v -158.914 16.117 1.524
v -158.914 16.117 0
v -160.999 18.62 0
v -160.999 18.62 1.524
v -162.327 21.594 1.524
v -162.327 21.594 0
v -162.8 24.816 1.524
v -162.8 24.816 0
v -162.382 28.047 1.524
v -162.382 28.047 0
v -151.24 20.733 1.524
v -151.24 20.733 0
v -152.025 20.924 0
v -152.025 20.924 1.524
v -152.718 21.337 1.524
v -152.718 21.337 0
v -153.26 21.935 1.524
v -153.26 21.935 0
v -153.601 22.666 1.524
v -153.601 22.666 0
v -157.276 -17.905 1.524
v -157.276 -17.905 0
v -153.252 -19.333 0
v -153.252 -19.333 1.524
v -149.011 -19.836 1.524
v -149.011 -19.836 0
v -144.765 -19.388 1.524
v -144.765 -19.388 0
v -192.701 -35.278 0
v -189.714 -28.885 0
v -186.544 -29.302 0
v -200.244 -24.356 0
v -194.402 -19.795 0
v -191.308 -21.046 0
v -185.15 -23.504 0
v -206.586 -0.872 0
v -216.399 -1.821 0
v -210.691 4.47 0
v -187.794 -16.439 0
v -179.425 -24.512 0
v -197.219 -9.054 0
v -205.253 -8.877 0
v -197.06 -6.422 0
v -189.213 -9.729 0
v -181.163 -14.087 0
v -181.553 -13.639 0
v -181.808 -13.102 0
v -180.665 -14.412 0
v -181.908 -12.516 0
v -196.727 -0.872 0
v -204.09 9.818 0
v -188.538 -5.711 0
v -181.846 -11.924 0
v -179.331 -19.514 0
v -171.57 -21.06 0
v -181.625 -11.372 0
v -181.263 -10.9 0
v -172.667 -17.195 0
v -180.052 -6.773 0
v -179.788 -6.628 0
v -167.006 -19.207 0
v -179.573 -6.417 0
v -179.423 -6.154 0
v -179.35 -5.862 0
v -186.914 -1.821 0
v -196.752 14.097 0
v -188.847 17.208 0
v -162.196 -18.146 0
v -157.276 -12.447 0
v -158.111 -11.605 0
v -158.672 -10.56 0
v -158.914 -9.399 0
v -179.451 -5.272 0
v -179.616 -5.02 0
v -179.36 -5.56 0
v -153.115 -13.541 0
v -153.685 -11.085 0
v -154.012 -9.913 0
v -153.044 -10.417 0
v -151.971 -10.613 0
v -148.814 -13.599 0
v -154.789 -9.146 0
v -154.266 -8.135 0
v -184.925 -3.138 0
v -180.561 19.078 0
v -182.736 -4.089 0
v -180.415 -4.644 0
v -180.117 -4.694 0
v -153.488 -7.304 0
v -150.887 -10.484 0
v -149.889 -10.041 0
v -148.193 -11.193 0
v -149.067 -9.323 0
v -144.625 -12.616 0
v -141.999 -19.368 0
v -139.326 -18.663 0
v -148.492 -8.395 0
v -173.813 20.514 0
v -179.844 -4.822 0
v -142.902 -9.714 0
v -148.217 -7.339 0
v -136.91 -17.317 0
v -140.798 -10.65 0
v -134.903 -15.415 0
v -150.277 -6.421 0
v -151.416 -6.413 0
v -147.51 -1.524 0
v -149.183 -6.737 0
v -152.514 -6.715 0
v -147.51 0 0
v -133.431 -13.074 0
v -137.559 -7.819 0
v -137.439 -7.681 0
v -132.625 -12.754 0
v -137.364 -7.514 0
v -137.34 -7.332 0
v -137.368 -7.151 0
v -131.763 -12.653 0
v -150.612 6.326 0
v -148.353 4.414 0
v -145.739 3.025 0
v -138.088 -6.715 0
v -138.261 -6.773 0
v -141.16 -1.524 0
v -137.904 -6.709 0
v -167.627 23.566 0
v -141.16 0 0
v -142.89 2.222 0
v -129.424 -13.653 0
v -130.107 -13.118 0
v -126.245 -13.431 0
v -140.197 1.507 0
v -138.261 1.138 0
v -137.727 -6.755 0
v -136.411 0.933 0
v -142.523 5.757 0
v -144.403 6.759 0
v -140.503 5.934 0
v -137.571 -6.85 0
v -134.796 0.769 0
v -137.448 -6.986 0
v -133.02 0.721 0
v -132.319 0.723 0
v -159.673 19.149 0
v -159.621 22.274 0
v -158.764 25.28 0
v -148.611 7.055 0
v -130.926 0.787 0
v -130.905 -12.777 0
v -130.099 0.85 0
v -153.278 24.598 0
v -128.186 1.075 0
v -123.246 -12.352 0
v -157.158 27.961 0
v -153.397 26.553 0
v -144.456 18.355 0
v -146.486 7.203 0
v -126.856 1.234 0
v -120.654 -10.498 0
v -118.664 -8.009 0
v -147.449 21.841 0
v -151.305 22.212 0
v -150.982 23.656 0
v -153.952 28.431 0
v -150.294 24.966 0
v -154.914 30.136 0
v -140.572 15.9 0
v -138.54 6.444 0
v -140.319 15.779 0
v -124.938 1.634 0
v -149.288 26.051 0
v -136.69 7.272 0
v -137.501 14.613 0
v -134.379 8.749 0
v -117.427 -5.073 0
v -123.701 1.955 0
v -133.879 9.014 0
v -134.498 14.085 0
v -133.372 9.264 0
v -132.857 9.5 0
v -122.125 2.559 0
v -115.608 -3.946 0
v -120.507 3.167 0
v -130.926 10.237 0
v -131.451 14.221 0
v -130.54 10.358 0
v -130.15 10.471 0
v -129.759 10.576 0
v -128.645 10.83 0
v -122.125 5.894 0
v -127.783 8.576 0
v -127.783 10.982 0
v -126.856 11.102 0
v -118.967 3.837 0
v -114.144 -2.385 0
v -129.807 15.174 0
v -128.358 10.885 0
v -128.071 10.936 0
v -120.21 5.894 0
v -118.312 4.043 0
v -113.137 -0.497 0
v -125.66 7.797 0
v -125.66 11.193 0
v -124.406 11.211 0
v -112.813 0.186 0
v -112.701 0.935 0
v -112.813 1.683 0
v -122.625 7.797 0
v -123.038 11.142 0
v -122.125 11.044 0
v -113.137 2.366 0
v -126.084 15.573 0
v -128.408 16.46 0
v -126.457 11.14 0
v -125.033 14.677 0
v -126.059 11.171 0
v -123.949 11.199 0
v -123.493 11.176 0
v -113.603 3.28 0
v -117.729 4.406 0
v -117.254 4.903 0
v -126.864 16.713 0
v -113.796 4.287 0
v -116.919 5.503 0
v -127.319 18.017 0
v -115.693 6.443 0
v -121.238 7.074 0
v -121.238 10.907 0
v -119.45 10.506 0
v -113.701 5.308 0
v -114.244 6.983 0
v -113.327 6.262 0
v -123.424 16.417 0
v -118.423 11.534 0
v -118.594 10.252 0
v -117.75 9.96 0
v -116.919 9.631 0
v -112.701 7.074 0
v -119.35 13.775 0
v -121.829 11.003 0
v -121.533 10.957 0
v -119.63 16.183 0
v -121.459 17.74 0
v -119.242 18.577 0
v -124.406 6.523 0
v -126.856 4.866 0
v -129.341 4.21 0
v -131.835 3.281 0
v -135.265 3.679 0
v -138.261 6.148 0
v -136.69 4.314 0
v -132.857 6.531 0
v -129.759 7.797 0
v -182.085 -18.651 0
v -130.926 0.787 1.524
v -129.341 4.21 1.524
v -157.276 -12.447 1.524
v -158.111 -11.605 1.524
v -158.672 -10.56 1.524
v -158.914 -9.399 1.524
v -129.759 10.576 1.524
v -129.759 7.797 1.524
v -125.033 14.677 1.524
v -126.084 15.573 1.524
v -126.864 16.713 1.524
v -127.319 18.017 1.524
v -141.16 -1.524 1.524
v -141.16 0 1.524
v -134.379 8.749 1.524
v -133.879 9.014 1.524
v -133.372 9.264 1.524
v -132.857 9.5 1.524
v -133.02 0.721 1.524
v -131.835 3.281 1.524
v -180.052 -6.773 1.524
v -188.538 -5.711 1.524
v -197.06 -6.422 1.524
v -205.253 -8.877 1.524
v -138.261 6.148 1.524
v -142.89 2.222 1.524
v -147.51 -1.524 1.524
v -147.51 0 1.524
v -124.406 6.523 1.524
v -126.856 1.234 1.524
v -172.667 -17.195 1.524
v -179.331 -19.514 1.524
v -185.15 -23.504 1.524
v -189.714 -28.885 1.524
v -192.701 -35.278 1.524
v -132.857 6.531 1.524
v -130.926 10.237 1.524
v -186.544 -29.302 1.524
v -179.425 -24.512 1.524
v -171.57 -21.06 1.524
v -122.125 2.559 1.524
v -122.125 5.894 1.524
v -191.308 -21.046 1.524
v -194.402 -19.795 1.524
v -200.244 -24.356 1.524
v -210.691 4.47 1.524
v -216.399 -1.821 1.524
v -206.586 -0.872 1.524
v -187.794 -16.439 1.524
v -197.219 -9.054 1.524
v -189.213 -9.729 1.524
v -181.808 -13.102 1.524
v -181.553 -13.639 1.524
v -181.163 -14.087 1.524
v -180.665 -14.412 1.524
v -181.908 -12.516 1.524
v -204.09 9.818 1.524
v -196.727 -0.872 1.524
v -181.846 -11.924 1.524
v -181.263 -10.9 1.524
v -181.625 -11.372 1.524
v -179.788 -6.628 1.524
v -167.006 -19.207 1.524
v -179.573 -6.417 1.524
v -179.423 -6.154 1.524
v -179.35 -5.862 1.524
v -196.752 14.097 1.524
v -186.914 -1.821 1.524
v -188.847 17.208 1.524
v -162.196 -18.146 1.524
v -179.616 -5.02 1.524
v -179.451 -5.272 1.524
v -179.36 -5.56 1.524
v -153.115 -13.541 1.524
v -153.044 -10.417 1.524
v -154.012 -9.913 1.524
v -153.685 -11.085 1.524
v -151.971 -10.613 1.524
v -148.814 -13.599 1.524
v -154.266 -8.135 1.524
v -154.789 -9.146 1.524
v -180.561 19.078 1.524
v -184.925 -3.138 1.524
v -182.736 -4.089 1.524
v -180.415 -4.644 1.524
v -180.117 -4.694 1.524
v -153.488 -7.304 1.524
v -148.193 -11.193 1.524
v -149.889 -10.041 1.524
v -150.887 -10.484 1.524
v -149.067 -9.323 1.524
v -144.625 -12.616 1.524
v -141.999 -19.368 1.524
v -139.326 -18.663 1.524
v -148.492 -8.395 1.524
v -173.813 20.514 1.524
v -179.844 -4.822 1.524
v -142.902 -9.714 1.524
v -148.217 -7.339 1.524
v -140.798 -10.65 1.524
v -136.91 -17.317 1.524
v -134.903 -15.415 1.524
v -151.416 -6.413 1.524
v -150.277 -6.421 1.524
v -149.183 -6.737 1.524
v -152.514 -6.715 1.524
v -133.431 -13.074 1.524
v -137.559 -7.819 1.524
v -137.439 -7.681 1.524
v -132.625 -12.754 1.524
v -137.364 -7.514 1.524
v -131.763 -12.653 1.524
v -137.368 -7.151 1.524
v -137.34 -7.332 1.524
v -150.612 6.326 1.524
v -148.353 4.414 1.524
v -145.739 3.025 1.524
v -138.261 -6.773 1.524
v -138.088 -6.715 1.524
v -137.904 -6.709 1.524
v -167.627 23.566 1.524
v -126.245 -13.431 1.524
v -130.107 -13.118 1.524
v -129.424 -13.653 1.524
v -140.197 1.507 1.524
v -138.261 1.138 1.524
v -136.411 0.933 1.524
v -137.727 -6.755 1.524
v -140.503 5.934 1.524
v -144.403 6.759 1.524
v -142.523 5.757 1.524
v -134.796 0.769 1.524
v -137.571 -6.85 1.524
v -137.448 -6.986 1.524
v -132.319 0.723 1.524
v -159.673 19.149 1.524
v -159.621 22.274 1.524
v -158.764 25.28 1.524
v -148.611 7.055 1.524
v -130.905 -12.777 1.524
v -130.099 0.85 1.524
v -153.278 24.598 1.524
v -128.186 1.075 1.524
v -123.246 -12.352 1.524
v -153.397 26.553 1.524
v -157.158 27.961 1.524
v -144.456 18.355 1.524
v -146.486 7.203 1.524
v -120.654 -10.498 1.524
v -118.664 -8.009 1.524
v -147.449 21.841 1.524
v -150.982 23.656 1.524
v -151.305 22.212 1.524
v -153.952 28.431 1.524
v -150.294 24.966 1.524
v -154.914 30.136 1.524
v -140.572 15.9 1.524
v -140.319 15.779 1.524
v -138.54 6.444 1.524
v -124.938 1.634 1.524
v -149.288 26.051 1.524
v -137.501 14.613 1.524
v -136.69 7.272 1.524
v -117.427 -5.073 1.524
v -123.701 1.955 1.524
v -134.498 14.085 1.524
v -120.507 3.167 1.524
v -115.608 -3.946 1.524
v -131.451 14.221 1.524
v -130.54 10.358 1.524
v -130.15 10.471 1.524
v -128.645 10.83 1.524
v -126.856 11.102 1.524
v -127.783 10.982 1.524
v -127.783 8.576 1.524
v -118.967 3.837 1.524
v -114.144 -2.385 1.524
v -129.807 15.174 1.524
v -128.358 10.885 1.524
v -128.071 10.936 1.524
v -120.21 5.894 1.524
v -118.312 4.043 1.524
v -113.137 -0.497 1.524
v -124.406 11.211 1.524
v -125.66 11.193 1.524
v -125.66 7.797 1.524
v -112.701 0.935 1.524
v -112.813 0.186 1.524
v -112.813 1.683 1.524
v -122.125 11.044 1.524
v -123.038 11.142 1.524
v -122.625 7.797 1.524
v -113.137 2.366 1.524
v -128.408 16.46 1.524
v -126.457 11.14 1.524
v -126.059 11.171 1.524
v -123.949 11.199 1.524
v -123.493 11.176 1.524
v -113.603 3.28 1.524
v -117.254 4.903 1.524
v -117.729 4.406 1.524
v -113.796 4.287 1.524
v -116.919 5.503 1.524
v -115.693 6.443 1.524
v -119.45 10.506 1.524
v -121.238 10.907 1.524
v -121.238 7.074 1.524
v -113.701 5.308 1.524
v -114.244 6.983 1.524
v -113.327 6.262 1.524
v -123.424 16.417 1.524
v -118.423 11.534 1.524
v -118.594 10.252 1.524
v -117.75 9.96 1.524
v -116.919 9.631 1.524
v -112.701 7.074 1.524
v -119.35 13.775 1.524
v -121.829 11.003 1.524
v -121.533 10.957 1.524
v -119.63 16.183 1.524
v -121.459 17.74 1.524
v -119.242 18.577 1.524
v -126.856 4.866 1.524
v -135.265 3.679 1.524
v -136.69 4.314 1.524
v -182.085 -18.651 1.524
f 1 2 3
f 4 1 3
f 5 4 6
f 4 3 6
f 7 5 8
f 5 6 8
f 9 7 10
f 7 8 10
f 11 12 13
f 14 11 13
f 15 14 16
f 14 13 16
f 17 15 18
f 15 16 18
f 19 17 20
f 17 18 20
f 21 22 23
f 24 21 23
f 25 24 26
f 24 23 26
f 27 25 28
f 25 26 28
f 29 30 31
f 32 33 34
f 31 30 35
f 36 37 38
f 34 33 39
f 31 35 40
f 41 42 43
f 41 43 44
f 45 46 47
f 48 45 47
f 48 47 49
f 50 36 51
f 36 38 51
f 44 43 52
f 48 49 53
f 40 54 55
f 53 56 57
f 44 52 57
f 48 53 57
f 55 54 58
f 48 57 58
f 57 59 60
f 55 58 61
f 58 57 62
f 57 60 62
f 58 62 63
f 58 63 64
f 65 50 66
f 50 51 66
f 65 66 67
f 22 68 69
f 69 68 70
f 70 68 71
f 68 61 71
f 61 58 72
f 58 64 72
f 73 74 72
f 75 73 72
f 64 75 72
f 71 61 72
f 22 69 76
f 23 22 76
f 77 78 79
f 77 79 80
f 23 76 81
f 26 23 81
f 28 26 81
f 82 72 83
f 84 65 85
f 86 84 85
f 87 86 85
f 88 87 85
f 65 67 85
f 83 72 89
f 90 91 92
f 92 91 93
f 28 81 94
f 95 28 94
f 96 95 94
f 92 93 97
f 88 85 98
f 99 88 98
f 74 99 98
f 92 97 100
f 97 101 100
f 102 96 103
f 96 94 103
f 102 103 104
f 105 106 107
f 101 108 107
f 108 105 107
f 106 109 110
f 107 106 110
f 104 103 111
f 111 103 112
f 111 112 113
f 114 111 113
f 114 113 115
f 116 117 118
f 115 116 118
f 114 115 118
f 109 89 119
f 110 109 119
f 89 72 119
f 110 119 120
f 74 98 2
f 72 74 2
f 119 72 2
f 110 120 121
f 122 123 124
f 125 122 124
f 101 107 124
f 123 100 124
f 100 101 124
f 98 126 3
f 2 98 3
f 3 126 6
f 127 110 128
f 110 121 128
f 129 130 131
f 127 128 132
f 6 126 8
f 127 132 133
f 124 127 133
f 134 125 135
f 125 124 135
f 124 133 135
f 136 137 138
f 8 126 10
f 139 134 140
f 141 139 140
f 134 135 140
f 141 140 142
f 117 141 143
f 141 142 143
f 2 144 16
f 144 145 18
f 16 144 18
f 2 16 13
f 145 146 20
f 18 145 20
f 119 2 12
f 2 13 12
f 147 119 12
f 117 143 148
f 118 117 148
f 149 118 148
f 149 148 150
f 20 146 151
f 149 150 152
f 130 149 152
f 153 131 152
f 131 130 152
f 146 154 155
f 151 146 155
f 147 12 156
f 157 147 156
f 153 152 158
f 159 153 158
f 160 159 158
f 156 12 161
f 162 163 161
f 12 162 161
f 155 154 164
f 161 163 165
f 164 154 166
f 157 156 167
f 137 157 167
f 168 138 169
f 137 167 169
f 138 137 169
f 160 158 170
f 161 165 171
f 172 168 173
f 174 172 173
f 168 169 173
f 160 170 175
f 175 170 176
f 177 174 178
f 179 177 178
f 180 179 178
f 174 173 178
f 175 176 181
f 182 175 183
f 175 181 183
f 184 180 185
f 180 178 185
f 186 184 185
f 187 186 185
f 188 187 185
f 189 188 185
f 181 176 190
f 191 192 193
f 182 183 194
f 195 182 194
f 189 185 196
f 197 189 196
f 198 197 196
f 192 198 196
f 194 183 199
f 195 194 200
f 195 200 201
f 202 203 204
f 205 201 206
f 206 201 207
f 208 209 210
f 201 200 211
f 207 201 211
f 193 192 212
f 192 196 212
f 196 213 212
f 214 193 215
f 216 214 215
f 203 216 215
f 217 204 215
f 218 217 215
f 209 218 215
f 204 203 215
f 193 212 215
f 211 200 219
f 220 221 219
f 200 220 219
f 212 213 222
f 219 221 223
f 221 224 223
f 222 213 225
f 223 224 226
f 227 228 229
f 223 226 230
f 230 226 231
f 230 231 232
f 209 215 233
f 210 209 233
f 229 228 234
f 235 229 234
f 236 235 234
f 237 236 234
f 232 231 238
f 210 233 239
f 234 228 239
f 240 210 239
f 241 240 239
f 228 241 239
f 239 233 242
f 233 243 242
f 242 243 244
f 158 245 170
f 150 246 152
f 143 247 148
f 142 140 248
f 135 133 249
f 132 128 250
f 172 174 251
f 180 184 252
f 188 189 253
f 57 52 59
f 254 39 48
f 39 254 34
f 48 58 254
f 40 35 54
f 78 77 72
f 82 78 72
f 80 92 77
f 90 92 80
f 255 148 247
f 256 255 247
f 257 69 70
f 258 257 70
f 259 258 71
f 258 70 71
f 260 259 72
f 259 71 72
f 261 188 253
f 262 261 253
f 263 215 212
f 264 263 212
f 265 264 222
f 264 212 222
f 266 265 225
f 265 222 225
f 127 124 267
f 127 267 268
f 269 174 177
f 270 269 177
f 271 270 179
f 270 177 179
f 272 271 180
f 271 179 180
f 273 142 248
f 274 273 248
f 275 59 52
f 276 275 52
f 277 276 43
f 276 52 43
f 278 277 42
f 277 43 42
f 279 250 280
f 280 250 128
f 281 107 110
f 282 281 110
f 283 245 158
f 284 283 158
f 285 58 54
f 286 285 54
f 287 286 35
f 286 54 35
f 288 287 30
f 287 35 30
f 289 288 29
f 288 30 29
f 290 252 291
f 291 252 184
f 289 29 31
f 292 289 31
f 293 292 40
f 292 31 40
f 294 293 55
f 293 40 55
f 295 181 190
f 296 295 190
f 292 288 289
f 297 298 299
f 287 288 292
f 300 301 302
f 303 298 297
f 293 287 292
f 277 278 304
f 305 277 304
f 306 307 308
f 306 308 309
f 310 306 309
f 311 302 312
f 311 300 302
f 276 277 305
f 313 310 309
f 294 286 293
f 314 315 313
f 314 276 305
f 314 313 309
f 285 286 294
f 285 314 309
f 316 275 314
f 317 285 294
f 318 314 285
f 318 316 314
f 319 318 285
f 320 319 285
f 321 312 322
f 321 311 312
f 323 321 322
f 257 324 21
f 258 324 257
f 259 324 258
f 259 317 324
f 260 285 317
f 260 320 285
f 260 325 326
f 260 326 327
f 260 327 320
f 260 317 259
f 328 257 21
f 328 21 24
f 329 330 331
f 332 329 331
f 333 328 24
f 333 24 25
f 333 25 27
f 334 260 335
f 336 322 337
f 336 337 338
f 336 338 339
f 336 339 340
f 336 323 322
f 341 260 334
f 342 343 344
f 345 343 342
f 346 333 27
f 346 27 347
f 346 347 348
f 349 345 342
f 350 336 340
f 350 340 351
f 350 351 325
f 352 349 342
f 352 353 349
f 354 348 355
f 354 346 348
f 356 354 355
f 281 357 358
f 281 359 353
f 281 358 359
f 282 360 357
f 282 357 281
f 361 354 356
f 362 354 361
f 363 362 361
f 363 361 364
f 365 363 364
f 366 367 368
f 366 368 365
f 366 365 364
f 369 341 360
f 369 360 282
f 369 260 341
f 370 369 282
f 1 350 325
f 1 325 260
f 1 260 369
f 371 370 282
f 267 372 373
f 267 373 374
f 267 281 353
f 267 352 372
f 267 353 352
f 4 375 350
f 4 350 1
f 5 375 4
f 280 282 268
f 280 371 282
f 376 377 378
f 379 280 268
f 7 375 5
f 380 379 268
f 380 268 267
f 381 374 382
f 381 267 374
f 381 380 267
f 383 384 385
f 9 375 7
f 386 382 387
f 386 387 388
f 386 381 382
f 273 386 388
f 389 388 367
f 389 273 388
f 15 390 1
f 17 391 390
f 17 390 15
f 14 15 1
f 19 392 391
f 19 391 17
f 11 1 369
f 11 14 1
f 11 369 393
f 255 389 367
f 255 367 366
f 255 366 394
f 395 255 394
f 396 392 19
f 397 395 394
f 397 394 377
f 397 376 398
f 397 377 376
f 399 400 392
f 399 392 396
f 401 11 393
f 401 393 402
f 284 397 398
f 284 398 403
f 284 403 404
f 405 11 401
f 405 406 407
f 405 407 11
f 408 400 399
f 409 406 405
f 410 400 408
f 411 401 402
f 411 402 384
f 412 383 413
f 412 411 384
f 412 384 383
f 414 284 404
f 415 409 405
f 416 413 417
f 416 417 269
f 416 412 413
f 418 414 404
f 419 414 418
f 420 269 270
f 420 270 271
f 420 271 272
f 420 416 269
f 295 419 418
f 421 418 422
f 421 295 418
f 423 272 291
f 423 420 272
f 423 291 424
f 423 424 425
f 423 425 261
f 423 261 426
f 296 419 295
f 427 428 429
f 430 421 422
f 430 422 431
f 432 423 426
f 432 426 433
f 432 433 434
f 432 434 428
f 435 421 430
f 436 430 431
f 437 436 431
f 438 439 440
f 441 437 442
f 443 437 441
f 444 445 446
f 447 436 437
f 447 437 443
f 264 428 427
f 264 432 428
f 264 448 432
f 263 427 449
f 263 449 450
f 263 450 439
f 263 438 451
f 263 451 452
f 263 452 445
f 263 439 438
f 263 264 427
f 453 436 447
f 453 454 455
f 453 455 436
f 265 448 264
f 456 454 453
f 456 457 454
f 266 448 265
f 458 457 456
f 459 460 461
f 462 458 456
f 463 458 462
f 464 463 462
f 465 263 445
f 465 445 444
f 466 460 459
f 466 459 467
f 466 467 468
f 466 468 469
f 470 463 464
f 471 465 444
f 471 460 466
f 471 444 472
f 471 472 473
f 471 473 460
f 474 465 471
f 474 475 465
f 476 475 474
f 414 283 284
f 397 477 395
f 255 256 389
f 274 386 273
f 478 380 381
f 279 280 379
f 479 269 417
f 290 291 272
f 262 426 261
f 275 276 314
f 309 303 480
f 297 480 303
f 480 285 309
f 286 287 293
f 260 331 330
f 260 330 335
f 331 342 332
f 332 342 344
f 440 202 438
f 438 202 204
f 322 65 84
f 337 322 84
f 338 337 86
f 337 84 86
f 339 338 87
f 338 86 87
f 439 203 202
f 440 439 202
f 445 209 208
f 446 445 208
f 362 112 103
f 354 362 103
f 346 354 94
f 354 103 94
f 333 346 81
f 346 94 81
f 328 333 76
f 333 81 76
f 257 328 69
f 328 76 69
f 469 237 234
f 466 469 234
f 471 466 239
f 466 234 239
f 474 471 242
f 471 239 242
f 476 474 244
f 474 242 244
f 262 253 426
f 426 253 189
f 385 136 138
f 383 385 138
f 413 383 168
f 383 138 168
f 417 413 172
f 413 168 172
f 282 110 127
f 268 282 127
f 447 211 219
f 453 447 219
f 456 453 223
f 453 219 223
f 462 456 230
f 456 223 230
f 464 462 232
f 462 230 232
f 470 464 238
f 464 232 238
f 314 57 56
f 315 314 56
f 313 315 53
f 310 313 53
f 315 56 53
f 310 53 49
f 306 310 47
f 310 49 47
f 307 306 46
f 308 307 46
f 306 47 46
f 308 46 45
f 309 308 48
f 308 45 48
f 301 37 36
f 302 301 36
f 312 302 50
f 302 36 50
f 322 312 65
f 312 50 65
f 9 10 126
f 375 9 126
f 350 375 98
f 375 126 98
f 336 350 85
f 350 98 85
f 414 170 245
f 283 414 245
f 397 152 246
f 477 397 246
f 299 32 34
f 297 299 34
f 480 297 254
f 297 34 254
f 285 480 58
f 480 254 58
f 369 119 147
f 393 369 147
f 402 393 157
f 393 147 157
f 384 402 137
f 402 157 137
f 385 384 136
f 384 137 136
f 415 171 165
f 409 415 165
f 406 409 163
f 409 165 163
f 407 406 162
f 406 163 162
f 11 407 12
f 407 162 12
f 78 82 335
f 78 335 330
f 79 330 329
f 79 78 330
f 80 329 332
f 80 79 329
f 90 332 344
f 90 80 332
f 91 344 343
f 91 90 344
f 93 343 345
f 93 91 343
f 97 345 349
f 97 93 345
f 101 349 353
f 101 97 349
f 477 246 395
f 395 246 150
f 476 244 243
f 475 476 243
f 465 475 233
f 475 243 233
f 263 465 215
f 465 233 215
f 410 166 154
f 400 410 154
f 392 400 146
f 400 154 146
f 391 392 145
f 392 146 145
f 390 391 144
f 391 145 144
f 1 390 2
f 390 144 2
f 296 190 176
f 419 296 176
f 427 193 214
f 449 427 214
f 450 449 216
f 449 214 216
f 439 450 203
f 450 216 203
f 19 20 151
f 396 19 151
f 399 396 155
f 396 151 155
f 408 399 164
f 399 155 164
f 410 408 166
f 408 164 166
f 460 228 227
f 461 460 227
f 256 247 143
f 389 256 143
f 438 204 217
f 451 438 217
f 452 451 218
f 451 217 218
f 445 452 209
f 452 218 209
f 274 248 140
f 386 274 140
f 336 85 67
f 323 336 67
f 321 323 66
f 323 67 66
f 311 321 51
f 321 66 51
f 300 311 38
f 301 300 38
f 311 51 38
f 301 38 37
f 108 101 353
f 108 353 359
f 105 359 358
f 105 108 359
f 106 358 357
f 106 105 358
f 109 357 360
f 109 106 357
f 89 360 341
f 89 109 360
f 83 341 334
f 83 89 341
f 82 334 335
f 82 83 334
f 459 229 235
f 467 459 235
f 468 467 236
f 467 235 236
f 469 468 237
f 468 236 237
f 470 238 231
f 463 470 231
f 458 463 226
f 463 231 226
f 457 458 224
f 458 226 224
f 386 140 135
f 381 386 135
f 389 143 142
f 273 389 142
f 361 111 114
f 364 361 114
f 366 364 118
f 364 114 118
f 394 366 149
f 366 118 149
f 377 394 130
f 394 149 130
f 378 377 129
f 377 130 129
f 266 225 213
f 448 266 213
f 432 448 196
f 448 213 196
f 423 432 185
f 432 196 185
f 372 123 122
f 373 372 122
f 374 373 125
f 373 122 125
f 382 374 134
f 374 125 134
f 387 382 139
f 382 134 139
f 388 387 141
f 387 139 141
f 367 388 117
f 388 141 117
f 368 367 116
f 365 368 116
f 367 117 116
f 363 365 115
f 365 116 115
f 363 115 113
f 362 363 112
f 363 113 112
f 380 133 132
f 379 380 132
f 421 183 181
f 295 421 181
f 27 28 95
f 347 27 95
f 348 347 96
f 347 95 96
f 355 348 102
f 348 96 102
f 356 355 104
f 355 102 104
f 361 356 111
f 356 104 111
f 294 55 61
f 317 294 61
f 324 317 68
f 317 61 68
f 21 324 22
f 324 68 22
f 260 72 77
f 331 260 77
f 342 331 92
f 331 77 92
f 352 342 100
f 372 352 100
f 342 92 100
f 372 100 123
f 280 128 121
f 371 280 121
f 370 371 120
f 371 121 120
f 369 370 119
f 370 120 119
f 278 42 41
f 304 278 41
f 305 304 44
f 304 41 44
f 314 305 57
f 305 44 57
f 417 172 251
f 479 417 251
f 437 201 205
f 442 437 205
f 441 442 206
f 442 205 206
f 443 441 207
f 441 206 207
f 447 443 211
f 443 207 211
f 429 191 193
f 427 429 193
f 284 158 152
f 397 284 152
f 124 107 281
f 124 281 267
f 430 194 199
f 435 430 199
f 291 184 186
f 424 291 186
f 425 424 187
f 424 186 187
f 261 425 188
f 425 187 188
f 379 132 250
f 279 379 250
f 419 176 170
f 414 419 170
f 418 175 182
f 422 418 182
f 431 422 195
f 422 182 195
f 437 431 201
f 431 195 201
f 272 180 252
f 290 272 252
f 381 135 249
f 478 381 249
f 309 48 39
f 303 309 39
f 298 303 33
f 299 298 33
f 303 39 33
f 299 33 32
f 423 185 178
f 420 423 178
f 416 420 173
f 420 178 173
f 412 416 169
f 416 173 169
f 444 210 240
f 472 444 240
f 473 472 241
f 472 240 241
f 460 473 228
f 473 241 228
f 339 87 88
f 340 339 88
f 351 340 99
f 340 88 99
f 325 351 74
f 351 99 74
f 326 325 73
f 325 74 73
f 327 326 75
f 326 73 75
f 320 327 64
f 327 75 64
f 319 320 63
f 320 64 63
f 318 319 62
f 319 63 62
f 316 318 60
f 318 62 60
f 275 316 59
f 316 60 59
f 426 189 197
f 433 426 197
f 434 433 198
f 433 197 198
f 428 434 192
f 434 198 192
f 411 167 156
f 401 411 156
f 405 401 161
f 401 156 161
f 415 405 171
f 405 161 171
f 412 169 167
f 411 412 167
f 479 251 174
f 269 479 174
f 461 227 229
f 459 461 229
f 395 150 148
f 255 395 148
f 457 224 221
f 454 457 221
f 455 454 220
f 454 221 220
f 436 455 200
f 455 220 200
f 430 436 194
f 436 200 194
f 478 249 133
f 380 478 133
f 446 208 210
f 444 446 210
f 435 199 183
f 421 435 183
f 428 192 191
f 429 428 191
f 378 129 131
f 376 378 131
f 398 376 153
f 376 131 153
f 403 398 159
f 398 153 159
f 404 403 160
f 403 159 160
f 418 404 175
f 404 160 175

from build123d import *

# Parameters (mm, degrees)
SKETCH1_W           = 6.35
SKETCH1_H           = 1.524
BOSS_EXTRUDE1_DEPTH = 1.524


with BuildPart() as part:
    # Sketch1 → Boss-Extrude1 (new body)
    with BuildSketch(Plane.XY):
        with BuildLine():
            Line((-118.967464928, 3.837147512), (-120.210313768, 5.894153968))
            Line((-120.210313768, 5.894153968), (-120.507329985, 3.167212811))
            Line((-120.507329985, 3.167212811), (-122.125463269, 2.558958735))
            Line((-122.125463269, 2.558958735), (-122.125463269, 5.894153968))
            Line((-122.125463269, 5.894153968), (-123.701040917, 1.954785522))
            Line((-123.701040917, 1.954785522), (-124.938272303, 1.633539151))
            Line((-124.938272303, 1.633539151), (-124.405721371, 6.522952497))
            Line((-124.405721371, 6.522952497), (-126.85553137, 1.234027863))
            Line((-126.85553137, 1.234027863), (-128.185864984, 1.075304442))
            Line((-128.185864984, 1.075304442), (-126.85553137, 4.86565074))
            Line((-126.85553137, 4.86565074), (-130.098565327, 0.850073658))
            Line((-130.098565327, 0.850073658), (-130.926497191, 0.78728846))
            Line((-130.926497191, 0.78728846), (-129.340887254, 4.210481059))
            Line((-129.340887254, 4.210481059), (-132.319280434, 0.722942299))
            Line((-132.319280434, 0.722942299), (-133.020376887, 0.72112245))
            Line((-133.020376887, 0.72112245), (-131.834849185, 3.28057264))
            Line((-131.834849185, 3.28057264), (-134.796306141, 0.76870718))
            Line((-134.796306141, 0.76870718), (-136.410777473, 0.933118092))
            Line((-136.410777473, 0.933118092), (-135.265463132, 3.678674725))
            Line((-135.265463132, 3.678674725), (-138.261220774, 1.137715912))
            Line((-138.261220774, 1.137715912), (-140.197350719, 1.50653427))
            Line((-140.197350719, 1.50653427), (-138.261220774, 6.147840352))
            Line((-138.261220774, 6.147840352), (-142.88987797, 2.221879477))
            ThreePointArc((-142.88987797, 2.221879477), (-147.08283508, 3.64953129), (-150.612134583, 6.325932612))
            ThreePointArc((-150.612134583, 6.325932612), (-146.485856937, 7.203077476), (-142.522861876, 5.757317996))
            ThreePointArc((-142.522861876, 5.757317996), (-139.511076326, 6.147840352), (-136.689748679, 7.271882262))
            Line((-136.689748679, 7.271882262), (-136.689748679, 4.31406956))
            Line((-136.689748679, 4.31406956), (-134.379090787, 8.749235121))
            ThreePointArc((-134.379090787, 8.749235121), (-133.626205107, 9.140656329), (-132.857462763, 9.499937023))
            Line((-132.857462763, 9.499937023), (-132.857462763, 6.530588828))
            Line((-132.857462763, 6.530588828), (-130.926497191, 10.236958357))
            ThreePointArc((-130.926497191, 10.236958357), (-130.345173873, 10.415525196), (-129.75871249, 10.576416347))
            Line((-129.75871249, 10.576416347), (-129.75871249, 7.796759722))
            Line((-129.75871249, 7.796759722), (-128.644783844, 10.830408865))
            ThreePointArc((-128.644783844, 10.830408865), (-128.214678718, 10.910834307), (-127.782924128, 10.981874047))
            Line((-127.782924128, 10.981874047), (-127.782924128, 8.576451057))
            Line((-127.782924128, 8.576451057), (-126.85553137, 11.102092407))
            ThreePointArc((-126.85553137, 11.102092407), (-126.258208322, 11.156424297), (-125.659529634, 11.192901774))
            Line((-125.659529634, 11.192901774), (-125.659529634, 7.796759722))
            Line((-125.659529634, 7.796759722), (-124.405721372, 11.211353983))
            ThreePointArc((-124.405721372, 11.211353983), (-123.721315902, 11.188391312), (-123.038090537, 11.142117871))
            Line((-123.038090537, 11.142117871), (-122.625154661, 7.796759722))
            Line((-122.625154661, 7.796759722), (-122.125463269, 11.04361803))
            ThreePointArc((-122.125463269, 11.04361803), (-121.68108693, 10.980301708), (-121.238235987, 10.907073779))
            Line((-121.238235987, 10.907073779), (-121.238235987, 7.074194908))
            Line((-121.238235987, 7.074194908), (-119.450305834, 10.506016758))
            ThreePointArc((-119.450305834, 10.506016758), (-118.170254613, 10.11057495), (-116.919404117, 9.630701645))
            ThreePointArc((-116.919404117, 9.630701645), (-119.349830951, 13.774572734), (-119.242407582, 18.577395072))
            ThreePointArc((-119.242407582, 18.577395072), (-122.479801343, 17.135418403), (-125.032625503, 14.677145863))
            ThreePointArc((-125.032625503, 14.677145863), (-126.511437413, 16.117497101), (-127.319227749, 18.017226326))
            ThreePointArc((-127.319227749, 18.017226326), (-129.072821157, 15.778913608), (-131.451278595, 14.220685806))
            ThreePointArc((-131.451278595, 14.220685806), (-136.013842114, 14.266990808), (-140.318864701, 15.778913608))
            Line((-140.318864701, 15.778913608), (-140.572063038, 15.900311384))
            ThreePointArc((-140.572063038, 15.900311384), (-146.082089593, 19.986277928), (-149.28772088, 26.05088371))
            ThreePointArc((-149.28772088, 26.05088371), (-150.98225883, 23.655808523), (-151.240302387, 20.733265531))
            ThreePointArc((-151.240302387, 20.733265531), (-152.718101686, 21.336819353), (-153.601407922, 22.66645768))
            ThreePointArc((-153.601407922, 22.66645768), (-153.396919216, 26.552679329), (-154.91417797, 30.136317175))
            ThreePointArc((-154.91417797, 30.136317175), (-159.291131596, 23.805118938), (-158.91395171, 16.117497101))
            ThreePointArc((-158.91395171, 16.117497101), (-162.327187611, 21.593822413), (-162.381546066, 28.046524436))
            ThreePointArc((-162.381546066, 28.046524436), (-170.625215942, 21.84762456), (-180.560631507, 19.077792393))
            ThreePointArc((-180.560631507, 19.077792393), (-200.503081439, 12.098235462), (-216.39853294, -1.821180682))
            ThreePointArc((-216.39853294, -1.821180682), (-201.656488756, -0.752866976), (-186.914444571, -1.821180682))
            ThreePointArc((-186.914444571, -1.821180682), (-183.850945452, -3.661612396), (-180.414923023, -4.644447892))
            ThreePointArc((-180.414923023, -4.644447892), (-179.359692742, -5.560033265), (-180.052236488, -6.773371915))
            ThreePointArc((-180.052236488, -6.773371915), (-192.817706831, -5.844622664), (-205.252520527, -8.876984225))
            ThreePointArc((-205.252520527, -8.876984225), (-193.210647633, -9.328958481), (-181.263188413, -10.900327847))
            ThreePointArc((-181.263188413, -10.900327847), (-181.878443359, -12.812123131), (-180.664874061, -14.412357306))
            ThreePointArc((-180.664874061, -14.412357306), (-191.17895358, -17.957183031), (-200.243848586, -24.35556846))
            ThreePointArc((-200.243848586, -24.35556846), (-186.726305796, -19.732822879), (-172.667325525, -17.19534115))
            ThreePointArc((-172.667325525, -17.19534115), (-185.150029357, -23.504388145), (-192.700842194, -35.277543815))
            ThreePointArc((-192.700842194, -35.277543815), (-183.0911903, -26.748605396), (-171.570271252, -21.060317047))
            ThreePointArc((-171.570271252, -21.060317047), (-164.623433194, -18.575118247), (-157.275939172, -17.904966269))
            ThreePointArc((-157.275939172, -17.904966269), (-151.145420538, -19.702741956), (-144.764510502, -19.387712987))
            ThreePointArc((-144.764510502, -19.387712987), (-138.075773009, -18.065674232), (-133.430936261, -13.074433174))
            ThreePointArc((-133.430936261, -13.074433174), (-131.329864526, -12.686756633), (-129.424108432, -13.652618554))
            ThreePointArc((-129.424108432, -13.652618554), (-121.886353154, -11.514694937), (-117.426632435, -5.072695004))
            ThreePointArc((-117.426632435, -5.072695004), (-114.82444132, -3.21357396), (-113.136821812, -0.497019148))
            ThreePointArc((-113.136821812, -0.497019148), (-112.701188688, 0.934666439), (-113.136821812, 2.366352026))
            ThreePointArc((-113.136821812, 2.366352026), (-113.78472542, 4.800381574), (-112.701188688, 7.074194908))
            ThreePointArc((-112.701188688, 7.074194908), (-114.988500666, 6.766664074), (-116.919404117, 5.502550489))
            ThreePointArc((-116.919404117, 5.502550489), (-117.728663328, 4.405730062), (-118.967464928, 3.837147512))
        make_face()
        with Locations((-144.335438151, -0.762)):
            Rectangle(SKETCH1_W, SKETCH1_H, mode=Mode.SUBTRACT)
        with BuildLine():
            ThreePointArc((-137.559244953, -7.819206053), (-146.689526794, -13.235024078), (-157.275939172, -12.446985783))
            ThreePointArc((-157.275939172, -12.446985783), (-158.429212855, -11.102896957), (-158.91395171, -9.399475928))
            ThreePointArc((-158.91395171, -9.399475928), (-148.192505964, -11.193493039), (-138.261220774, -6.773371915))
            ThreePointArc((-138.261220774, -6.773371915), (-137.447536507, -6.985721903), (-137.559244953, -7.819206053))
        make_face(mode=Mode.SUBTRACT)
        with BuildLine():
            ThreePointArc((-148.216931549, -7.339340233), (-151.974990586, -6.526199766), (-154.789067747, -9.14634764))
            ThreePointArc((-154.789067747, -9.14634764), (-150.886892893, -10.483641343), (-148.216931549, -7.339340233))
        make_face(mode=Mode.SUBTRACT)
    extrude(amount=BOSS_EXTRUDE1_DEPTH)


solid = part.part
